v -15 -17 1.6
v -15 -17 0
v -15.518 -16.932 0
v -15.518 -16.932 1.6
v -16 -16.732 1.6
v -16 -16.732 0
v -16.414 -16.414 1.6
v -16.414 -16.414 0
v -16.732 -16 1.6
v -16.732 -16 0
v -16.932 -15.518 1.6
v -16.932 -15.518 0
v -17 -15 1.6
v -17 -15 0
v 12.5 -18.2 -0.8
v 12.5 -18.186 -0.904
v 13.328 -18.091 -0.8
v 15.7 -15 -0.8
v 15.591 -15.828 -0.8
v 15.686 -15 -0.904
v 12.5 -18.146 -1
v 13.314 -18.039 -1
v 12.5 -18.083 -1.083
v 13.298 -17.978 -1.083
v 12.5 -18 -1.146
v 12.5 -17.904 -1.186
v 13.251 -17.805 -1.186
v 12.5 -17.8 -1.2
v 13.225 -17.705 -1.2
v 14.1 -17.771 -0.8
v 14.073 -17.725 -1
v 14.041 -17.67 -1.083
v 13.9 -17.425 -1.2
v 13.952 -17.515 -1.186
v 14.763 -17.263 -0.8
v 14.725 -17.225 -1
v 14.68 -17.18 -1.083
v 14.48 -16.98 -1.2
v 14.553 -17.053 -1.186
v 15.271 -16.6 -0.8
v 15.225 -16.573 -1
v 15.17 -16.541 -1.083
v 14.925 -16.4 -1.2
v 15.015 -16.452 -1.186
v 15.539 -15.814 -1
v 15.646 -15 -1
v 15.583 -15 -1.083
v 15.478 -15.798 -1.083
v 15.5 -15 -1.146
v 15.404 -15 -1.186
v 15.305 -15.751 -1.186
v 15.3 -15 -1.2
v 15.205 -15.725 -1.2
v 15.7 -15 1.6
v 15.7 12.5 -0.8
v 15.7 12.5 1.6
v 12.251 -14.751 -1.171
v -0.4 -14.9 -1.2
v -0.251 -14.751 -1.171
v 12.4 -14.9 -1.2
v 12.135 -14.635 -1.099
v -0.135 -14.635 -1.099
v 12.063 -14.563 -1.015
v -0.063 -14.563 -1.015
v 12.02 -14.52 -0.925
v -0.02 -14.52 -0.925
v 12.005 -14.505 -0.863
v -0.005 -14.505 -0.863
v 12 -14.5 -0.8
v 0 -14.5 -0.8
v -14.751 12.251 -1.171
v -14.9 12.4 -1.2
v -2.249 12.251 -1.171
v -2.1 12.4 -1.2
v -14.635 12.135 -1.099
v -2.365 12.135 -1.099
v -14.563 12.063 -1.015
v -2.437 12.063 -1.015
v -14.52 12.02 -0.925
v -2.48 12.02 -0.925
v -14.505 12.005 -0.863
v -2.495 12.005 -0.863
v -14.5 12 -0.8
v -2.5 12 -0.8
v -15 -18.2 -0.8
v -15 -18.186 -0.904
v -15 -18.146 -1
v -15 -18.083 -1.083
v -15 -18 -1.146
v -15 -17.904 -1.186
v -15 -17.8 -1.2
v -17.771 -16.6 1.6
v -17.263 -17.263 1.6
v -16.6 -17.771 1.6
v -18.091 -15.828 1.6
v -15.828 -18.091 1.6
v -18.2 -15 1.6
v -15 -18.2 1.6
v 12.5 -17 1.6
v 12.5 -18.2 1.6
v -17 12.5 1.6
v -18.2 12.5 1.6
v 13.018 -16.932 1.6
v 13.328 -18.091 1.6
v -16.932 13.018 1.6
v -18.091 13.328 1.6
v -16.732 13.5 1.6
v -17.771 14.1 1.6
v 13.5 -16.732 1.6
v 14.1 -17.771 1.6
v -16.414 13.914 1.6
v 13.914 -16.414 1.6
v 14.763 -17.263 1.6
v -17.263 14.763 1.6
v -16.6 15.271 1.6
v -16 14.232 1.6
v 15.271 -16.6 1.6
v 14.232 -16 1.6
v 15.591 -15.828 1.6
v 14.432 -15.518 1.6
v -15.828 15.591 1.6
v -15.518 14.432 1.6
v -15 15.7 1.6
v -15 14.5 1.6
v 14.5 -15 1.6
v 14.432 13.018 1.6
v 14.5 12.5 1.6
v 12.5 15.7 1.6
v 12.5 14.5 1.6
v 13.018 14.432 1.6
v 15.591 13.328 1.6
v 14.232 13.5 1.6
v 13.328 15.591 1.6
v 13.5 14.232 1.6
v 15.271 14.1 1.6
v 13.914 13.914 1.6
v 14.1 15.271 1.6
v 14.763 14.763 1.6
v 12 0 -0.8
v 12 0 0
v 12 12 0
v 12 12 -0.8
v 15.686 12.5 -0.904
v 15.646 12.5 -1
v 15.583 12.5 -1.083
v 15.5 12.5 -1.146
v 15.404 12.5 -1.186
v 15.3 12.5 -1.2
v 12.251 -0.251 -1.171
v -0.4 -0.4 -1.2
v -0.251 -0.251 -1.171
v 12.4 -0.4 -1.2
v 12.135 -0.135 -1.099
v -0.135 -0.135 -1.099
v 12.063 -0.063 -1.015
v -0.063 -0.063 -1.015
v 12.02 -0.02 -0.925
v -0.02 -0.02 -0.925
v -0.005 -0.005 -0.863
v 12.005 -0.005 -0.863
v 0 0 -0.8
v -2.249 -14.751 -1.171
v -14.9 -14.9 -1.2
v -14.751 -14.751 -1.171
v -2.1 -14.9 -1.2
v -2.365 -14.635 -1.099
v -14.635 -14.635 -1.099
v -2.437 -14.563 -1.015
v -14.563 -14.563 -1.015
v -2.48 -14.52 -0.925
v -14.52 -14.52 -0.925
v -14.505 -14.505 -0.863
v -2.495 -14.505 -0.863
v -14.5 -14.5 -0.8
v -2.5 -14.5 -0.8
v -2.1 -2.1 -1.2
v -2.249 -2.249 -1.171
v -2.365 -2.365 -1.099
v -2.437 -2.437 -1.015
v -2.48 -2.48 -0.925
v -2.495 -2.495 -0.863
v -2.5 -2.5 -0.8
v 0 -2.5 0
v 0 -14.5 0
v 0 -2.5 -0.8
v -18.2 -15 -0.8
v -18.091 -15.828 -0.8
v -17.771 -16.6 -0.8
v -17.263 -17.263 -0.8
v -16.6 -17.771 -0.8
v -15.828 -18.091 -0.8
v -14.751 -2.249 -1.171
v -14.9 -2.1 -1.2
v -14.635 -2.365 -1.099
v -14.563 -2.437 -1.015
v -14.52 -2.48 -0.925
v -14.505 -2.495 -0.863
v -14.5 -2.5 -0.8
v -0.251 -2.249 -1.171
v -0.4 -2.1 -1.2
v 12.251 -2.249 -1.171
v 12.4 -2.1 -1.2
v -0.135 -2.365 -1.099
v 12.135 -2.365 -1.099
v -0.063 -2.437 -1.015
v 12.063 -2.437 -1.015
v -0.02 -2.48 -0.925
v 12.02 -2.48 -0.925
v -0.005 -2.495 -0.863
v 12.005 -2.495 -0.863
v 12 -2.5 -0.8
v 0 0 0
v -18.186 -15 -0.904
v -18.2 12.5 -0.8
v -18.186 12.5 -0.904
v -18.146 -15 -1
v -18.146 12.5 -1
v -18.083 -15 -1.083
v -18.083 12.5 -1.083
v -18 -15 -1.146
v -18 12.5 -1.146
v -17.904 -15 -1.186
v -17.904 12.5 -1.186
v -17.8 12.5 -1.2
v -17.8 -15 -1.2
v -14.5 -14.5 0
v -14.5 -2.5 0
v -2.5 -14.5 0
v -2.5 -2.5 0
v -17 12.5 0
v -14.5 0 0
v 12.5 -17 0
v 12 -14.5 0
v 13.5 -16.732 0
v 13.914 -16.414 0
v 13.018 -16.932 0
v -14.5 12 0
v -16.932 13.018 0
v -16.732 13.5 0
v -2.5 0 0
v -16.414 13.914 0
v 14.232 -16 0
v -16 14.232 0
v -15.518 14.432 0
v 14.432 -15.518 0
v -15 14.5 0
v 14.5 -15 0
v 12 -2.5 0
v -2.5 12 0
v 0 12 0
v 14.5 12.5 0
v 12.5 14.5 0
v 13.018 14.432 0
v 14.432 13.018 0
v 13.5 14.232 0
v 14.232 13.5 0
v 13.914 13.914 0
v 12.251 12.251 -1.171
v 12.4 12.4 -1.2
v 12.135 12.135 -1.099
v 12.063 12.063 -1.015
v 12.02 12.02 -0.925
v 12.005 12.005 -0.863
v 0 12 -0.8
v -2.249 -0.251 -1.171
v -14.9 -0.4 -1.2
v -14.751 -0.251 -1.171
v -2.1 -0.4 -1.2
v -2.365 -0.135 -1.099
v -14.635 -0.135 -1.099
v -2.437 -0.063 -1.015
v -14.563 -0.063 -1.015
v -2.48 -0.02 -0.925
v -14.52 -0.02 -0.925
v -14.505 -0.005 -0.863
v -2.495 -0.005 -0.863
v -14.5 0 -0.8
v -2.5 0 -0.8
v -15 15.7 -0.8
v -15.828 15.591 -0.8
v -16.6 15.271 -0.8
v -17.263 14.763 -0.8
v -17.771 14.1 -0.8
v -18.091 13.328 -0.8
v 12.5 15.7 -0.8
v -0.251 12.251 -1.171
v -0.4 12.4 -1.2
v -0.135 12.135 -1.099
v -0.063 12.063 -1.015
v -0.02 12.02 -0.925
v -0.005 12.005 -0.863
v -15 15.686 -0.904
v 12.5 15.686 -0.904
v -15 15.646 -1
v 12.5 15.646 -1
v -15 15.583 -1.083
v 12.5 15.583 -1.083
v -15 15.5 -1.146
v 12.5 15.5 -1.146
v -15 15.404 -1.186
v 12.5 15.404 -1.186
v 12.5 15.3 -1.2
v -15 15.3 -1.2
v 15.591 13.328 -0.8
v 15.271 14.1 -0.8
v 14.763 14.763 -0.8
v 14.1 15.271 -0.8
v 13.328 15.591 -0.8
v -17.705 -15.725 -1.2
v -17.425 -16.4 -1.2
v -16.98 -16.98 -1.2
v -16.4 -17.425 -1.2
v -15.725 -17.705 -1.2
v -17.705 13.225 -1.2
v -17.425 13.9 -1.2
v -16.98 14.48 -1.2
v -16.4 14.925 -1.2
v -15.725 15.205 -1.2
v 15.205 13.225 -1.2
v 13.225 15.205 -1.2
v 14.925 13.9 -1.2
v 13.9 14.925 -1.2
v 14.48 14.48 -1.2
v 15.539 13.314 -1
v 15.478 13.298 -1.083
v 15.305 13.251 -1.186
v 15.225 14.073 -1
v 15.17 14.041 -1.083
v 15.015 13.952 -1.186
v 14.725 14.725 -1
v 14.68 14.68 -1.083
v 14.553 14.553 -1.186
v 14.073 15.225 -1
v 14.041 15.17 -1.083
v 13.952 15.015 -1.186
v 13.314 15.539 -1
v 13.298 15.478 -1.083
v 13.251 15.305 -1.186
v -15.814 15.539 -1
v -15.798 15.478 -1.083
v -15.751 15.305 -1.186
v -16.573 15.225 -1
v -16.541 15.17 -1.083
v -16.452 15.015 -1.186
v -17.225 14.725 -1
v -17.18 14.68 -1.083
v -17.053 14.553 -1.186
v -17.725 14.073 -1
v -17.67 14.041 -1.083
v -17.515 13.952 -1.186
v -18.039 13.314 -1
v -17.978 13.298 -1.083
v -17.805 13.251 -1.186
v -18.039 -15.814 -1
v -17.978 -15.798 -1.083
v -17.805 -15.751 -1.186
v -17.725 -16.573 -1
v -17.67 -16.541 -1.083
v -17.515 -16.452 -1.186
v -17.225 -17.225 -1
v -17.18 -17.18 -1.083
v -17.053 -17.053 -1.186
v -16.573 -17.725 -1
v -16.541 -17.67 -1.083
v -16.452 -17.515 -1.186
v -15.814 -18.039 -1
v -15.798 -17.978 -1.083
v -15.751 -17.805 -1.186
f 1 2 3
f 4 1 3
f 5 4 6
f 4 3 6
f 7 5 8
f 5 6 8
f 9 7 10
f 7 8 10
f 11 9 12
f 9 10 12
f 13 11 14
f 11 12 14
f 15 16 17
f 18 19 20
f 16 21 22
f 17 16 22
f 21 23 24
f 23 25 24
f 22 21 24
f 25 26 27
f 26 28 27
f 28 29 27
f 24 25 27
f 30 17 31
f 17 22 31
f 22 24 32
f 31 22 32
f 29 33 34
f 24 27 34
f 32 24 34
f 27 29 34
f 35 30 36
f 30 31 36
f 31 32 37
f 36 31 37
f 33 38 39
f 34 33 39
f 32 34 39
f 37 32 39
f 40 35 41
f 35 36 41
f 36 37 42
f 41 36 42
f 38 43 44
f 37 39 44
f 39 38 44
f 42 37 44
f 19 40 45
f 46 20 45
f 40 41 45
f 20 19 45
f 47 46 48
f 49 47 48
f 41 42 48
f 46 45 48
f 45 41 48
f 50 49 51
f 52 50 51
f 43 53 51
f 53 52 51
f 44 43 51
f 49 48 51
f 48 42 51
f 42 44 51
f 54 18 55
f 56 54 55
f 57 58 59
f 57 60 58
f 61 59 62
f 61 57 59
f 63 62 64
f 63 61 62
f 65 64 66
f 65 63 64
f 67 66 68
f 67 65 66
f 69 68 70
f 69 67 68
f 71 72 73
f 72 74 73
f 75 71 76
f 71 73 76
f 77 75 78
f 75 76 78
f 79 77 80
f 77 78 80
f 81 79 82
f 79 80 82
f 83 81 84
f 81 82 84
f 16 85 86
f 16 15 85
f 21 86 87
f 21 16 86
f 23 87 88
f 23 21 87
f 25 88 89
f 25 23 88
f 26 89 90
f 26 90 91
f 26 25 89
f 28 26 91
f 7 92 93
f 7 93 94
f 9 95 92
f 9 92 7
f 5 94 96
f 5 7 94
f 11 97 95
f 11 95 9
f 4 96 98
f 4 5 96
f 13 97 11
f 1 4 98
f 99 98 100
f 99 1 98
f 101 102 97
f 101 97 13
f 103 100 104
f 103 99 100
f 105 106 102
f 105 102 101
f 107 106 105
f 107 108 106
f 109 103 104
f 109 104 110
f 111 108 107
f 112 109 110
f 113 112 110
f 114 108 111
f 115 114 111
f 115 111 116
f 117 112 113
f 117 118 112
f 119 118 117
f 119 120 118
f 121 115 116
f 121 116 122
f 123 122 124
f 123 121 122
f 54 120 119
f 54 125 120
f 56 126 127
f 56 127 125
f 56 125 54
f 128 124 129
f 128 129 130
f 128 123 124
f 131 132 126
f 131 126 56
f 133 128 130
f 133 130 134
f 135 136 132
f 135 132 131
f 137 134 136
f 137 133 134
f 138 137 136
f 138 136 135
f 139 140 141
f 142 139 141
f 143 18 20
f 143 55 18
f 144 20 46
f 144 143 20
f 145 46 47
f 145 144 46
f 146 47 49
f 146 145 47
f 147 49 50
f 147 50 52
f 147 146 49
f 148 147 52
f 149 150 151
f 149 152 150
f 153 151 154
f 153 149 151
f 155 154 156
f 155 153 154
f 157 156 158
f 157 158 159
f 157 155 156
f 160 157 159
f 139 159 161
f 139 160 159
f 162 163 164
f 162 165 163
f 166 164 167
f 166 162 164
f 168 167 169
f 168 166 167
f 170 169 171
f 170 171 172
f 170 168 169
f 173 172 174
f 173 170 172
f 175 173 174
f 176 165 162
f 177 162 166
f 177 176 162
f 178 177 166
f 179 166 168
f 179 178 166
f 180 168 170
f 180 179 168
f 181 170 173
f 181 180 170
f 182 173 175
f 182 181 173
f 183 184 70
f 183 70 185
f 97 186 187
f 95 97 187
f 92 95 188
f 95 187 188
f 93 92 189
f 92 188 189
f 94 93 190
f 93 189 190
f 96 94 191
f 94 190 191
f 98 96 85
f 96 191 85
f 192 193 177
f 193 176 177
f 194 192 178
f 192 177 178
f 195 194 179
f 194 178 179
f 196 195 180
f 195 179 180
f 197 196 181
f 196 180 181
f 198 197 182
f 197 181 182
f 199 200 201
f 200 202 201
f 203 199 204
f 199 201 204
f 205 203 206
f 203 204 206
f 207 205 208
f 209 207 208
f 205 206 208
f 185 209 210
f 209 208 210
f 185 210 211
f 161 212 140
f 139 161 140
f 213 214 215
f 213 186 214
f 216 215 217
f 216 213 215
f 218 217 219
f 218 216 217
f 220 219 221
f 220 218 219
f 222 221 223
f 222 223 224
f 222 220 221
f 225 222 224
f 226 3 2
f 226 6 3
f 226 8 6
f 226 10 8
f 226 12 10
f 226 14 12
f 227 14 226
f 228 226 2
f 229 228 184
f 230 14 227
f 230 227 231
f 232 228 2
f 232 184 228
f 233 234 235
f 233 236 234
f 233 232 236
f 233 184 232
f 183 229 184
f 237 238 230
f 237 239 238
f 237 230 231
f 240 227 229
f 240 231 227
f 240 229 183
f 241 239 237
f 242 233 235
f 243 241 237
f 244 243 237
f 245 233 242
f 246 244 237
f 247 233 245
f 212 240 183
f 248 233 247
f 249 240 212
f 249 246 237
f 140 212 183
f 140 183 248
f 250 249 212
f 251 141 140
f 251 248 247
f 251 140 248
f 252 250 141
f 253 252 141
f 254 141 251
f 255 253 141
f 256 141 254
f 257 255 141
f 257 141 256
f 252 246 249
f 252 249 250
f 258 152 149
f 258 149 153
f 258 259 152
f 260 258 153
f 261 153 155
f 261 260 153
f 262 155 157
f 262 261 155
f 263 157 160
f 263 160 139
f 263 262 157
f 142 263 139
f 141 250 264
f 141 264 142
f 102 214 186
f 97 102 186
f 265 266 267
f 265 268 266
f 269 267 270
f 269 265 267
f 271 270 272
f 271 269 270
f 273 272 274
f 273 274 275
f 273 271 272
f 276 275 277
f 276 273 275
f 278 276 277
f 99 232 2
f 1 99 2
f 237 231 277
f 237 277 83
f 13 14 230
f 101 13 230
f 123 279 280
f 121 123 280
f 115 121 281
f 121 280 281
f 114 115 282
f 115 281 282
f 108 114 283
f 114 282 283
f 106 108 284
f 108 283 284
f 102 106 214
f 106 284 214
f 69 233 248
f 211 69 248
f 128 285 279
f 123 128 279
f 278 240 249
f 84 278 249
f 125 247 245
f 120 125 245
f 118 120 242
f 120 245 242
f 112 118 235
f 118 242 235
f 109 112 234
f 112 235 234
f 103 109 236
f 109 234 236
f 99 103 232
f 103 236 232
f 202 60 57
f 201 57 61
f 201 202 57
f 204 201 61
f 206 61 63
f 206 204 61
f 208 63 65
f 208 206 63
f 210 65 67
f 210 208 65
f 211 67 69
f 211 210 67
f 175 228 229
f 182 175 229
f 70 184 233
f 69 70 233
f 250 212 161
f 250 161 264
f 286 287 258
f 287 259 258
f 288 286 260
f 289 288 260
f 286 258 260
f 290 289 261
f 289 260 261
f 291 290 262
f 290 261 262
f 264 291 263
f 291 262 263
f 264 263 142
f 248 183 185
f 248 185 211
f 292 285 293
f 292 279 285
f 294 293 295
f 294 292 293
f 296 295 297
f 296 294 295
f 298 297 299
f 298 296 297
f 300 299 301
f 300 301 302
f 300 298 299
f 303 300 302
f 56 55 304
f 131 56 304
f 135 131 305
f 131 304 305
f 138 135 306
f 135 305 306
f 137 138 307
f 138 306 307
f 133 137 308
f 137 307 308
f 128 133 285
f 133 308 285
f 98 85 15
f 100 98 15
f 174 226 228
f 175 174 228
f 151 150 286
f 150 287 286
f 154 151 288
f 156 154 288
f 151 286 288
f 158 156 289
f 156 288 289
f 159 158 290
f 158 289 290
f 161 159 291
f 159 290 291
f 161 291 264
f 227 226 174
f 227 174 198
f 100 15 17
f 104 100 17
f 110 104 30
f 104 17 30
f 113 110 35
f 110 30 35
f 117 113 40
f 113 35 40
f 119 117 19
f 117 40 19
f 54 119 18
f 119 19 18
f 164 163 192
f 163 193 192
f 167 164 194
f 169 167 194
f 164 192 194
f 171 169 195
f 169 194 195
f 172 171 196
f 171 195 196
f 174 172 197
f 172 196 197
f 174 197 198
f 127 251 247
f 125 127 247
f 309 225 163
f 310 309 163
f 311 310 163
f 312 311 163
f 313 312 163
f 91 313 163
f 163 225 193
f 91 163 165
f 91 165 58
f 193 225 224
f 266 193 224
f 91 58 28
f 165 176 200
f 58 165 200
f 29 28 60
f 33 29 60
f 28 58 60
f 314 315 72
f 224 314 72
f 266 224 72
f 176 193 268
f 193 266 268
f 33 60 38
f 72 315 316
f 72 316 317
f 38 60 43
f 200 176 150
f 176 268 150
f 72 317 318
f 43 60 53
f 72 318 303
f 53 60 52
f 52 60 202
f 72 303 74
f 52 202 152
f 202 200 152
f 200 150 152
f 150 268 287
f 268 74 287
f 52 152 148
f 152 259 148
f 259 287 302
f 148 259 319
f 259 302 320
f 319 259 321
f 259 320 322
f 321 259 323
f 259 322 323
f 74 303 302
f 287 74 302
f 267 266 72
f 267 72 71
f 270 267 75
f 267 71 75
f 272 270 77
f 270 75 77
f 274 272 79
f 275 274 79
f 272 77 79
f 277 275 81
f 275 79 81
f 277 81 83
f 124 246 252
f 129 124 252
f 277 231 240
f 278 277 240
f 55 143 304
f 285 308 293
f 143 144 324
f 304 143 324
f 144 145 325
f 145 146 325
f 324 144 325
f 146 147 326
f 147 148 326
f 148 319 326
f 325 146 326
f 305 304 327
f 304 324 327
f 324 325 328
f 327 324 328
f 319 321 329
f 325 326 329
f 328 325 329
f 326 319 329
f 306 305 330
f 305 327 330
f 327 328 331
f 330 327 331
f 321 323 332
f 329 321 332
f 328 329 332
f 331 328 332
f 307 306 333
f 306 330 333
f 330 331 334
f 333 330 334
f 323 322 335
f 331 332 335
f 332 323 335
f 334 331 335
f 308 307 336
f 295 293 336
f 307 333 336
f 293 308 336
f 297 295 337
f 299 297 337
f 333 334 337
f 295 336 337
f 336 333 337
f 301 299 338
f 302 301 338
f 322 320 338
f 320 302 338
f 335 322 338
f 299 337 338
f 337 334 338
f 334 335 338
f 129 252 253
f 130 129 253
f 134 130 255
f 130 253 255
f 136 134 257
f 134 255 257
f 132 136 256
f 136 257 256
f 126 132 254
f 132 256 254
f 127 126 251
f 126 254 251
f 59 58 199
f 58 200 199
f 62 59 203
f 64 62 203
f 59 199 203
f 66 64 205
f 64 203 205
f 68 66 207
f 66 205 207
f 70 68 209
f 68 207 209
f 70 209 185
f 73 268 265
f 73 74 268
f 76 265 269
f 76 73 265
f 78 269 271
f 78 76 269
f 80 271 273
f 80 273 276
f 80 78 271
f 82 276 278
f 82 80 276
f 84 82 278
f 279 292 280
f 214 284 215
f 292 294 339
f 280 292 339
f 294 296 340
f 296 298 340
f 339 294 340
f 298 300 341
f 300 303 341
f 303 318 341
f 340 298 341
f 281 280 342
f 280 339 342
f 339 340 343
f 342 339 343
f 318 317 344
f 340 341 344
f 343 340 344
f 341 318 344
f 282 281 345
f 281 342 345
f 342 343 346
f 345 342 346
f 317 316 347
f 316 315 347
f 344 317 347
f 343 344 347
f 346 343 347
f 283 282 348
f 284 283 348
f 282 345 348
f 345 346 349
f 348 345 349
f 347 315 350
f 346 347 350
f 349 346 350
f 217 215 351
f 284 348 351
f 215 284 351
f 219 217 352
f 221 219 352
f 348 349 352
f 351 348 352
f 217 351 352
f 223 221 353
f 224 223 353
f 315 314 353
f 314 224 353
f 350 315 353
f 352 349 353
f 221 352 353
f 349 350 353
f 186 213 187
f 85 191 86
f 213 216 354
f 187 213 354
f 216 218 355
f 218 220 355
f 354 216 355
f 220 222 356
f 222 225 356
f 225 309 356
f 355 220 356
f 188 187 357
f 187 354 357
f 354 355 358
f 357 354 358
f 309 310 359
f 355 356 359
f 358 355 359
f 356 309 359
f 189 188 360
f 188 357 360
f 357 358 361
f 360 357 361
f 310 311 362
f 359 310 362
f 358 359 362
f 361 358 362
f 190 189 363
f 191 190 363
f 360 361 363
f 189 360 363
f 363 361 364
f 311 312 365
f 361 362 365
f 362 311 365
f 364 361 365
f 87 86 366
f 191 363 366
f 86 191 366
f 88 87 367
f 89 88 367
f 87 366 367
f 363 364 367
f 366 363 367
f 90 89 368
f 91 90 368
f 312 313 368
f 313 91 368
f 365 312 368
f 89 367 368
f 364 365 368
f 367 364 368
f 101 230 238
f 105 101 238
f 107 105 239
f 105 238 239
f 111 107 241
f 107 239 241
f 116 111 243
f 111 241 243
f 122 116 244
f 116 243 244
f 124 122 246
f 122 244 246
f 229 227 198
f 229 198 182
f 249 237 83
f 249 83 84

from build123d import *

# Parameters (mm, degrees)
F0_W     = 12
F0_H     = 12
F1_DEPTH = 1.2
F2_DEPTH = 1.6
F3_R     = 0.4


with BuildPart() as f1:
    # F0 (on Top) → F1 (new body)
    with BuildSketch(Plane.XY):
        with BuildLine():
            Line((12.5, 15.7), (-15, 15.7))
            ThreePointArc((-15, 15.7), (-17.2627416998, 14.7627416998), (-18.2, 12.5))
            Line((-18.2, 12.5), (-18.2, -15))
            ThreePointArc((-18.2, -15), (-17.2627416998, -17.2627416998), (-15, -18.2))
            Line((-15, -18.2), (12.5, -18.2))
            ThreePointArc((12.5, -18.2), (14.7627416998, -17.2627416998), (15.7, -15))
            Line((15.7, -15), (15.7, 12.5))
            ThreePointArc((15.7, 12.5), (14.7627416998, 14.7627416998), (12.5, 15.7))
        make_face()
        with BuildLine():
            ThreePointArc((-17, 12.5), (-16.4142135624, 13.9142135624), (-15, 14.5))
            Line((-15, 14.5), (12.5, 14.5))
            ThreePointArc((12.5, 14.5), (13.9142135624, 13.9142135624), (14.5, 12.5))
            Line((14.5, 12.5), (14.5, -15))
            ThreePointArc((14.5, -15), (13.9142135624, -16.4142135624), (12.5, -17))
            Line((12.5, -17), (-15, -17))
            ThreePointArc((-15, -17), (-16.4142135624, -16.4142135624), (-17, -15))
            Line((-17, -15), (-17, 12.5))
        make_face(mode=Mode.SUBTRACT)
        with BuildLine():
            Line((12.5, 14.5), (-15, 14.5))
            ThreePointArc((-15, 14.5), (-16.4142135624, 13.9142135624), (-17, 12.5))
            Line((-17, 12.5), (-17, -15))
            ThreePointArc((-17, -15), (-16.4142135624, -16.4142135624), (-15, -17))
            Line((-15, -17), (12.5, -17))
            ThreePointArc((12.5, -17), (13.9142135624, -16.4142135624), (14.5, -15))
            Line((14.5, -15), (14.5, 12.5))
            ThreePointArc((14.5, 12.5), (13.9142135624, 13.9142135624), (12.5, 14.5))
        make_face()
        with Locations((-8.5, -8.5)):
            Rectangle(F0_W, F0_H, mode=Mode.SUBTRACT)
        with Locations((6, -8.5)):
            Rectangle(F0_W, F0_H, mode=Mode.SUBTRACT)
        with Locations((-8.5, 6)):
            Rectangle(F0_W, F0_H, mode=Mode.SUBTRACT)
        with Locations((6, 6)):
            Rectangle(F0_W, F0_H, mode=Mode.SUBTRACT)
    extrude(amount=-F1_DEPTH)

    # F0 (on Top) → F2 (join)
    with BuildSketch(Plane.XY):
        with BuildLine():
            Line((12.5, 15.7), (-15, 15.7))
            ThreePointArc((-15, 15.7), (-17.2627416998, 14.7627416998), (-18.2, 12.5))
            Line((-18.2, 12.5), (-18.2, -15))
            ThreePointArc((-18.2, -15), (-17.2627416998, -17.2627416998), (-15, -18.2))
            Line((-15, -18.2), (12.5, -18.2))
            ThreePointArc((12.5, -18.2), (14.7627416998, -17.2627416998), (15.7, -15))
            Line((15.7, -15), (15.7, 12.5))
            ThreePointArc((15.7, 12.5), (14.7627416998, 14.7627416998), (12.5, 15.7))
        make_face()
        with BuildLine():
            ThreePointArc((-17, 12.5), (-16.4142135624, 13.9142135624), (-15, 14.5))
            Line((-15, 14.5), (12.5, 14.5))
            ThreePointArc((12.5, 14.5), (13.9142135624, 13.9142135624), (14.5, 12.5))
            Line((14.5, 12.5), (14.5, -15))
            ThreePointArc((14.5, -15), (13.9142135624, -16.4142135624), (12.5, -17))
            Line((12.5, -17), (-15, -17))
            ThreePointArc((-15, -17), (-16.4142135624, -16.4142135624), (-17, -15))
            Line((-17, -15), (-17, 12.5))
        make_face(mode=Mode.SUBTRACT)
    extrude(amount=F2_DEPTH)

    # F3
    f3_edges = [f1.edges().sort_by_distance(p)[0] for p in [
        (-8.5, -2.5, -1.2),
        (-2.5, -8.5, -1.2),
        (-8.5, -14.5, -1.2),
        (-14.5, -8.5, -1.2),
        (6, -2.5, -1.2),
        (12, -8.5, -1.2),
        (6, -14.5, -1.2),
        (0, -8.5, -1.2),
        (-8.5, 12, -1.2),
        (-2.5, 6, -1.2),
        (-8.5, 0, -1.2),
        (-14.5, 6, -1.2),
        (6, 0, -1.2),
        (0, 6, -1.2),
        (6, 12, -1.2),
        (12, 6, -1.2),
        (-1.25, 15.7, -1.2),
        (-17.262742, 14.762742, -1.2),
        (-18.2, -1.25, -1.2),
        (-17.262742, -17.262742, -1.2),
        (-1.25, -18.2, -1.2),
        (14.762742, -17.262742, -1.2),
        (15.7, -1.25, -1.2),
        (14.762742, 14.762742, -1.2),
    ]]
    fillet(f3_edges, radius=F3_R)


solid = f1.part
